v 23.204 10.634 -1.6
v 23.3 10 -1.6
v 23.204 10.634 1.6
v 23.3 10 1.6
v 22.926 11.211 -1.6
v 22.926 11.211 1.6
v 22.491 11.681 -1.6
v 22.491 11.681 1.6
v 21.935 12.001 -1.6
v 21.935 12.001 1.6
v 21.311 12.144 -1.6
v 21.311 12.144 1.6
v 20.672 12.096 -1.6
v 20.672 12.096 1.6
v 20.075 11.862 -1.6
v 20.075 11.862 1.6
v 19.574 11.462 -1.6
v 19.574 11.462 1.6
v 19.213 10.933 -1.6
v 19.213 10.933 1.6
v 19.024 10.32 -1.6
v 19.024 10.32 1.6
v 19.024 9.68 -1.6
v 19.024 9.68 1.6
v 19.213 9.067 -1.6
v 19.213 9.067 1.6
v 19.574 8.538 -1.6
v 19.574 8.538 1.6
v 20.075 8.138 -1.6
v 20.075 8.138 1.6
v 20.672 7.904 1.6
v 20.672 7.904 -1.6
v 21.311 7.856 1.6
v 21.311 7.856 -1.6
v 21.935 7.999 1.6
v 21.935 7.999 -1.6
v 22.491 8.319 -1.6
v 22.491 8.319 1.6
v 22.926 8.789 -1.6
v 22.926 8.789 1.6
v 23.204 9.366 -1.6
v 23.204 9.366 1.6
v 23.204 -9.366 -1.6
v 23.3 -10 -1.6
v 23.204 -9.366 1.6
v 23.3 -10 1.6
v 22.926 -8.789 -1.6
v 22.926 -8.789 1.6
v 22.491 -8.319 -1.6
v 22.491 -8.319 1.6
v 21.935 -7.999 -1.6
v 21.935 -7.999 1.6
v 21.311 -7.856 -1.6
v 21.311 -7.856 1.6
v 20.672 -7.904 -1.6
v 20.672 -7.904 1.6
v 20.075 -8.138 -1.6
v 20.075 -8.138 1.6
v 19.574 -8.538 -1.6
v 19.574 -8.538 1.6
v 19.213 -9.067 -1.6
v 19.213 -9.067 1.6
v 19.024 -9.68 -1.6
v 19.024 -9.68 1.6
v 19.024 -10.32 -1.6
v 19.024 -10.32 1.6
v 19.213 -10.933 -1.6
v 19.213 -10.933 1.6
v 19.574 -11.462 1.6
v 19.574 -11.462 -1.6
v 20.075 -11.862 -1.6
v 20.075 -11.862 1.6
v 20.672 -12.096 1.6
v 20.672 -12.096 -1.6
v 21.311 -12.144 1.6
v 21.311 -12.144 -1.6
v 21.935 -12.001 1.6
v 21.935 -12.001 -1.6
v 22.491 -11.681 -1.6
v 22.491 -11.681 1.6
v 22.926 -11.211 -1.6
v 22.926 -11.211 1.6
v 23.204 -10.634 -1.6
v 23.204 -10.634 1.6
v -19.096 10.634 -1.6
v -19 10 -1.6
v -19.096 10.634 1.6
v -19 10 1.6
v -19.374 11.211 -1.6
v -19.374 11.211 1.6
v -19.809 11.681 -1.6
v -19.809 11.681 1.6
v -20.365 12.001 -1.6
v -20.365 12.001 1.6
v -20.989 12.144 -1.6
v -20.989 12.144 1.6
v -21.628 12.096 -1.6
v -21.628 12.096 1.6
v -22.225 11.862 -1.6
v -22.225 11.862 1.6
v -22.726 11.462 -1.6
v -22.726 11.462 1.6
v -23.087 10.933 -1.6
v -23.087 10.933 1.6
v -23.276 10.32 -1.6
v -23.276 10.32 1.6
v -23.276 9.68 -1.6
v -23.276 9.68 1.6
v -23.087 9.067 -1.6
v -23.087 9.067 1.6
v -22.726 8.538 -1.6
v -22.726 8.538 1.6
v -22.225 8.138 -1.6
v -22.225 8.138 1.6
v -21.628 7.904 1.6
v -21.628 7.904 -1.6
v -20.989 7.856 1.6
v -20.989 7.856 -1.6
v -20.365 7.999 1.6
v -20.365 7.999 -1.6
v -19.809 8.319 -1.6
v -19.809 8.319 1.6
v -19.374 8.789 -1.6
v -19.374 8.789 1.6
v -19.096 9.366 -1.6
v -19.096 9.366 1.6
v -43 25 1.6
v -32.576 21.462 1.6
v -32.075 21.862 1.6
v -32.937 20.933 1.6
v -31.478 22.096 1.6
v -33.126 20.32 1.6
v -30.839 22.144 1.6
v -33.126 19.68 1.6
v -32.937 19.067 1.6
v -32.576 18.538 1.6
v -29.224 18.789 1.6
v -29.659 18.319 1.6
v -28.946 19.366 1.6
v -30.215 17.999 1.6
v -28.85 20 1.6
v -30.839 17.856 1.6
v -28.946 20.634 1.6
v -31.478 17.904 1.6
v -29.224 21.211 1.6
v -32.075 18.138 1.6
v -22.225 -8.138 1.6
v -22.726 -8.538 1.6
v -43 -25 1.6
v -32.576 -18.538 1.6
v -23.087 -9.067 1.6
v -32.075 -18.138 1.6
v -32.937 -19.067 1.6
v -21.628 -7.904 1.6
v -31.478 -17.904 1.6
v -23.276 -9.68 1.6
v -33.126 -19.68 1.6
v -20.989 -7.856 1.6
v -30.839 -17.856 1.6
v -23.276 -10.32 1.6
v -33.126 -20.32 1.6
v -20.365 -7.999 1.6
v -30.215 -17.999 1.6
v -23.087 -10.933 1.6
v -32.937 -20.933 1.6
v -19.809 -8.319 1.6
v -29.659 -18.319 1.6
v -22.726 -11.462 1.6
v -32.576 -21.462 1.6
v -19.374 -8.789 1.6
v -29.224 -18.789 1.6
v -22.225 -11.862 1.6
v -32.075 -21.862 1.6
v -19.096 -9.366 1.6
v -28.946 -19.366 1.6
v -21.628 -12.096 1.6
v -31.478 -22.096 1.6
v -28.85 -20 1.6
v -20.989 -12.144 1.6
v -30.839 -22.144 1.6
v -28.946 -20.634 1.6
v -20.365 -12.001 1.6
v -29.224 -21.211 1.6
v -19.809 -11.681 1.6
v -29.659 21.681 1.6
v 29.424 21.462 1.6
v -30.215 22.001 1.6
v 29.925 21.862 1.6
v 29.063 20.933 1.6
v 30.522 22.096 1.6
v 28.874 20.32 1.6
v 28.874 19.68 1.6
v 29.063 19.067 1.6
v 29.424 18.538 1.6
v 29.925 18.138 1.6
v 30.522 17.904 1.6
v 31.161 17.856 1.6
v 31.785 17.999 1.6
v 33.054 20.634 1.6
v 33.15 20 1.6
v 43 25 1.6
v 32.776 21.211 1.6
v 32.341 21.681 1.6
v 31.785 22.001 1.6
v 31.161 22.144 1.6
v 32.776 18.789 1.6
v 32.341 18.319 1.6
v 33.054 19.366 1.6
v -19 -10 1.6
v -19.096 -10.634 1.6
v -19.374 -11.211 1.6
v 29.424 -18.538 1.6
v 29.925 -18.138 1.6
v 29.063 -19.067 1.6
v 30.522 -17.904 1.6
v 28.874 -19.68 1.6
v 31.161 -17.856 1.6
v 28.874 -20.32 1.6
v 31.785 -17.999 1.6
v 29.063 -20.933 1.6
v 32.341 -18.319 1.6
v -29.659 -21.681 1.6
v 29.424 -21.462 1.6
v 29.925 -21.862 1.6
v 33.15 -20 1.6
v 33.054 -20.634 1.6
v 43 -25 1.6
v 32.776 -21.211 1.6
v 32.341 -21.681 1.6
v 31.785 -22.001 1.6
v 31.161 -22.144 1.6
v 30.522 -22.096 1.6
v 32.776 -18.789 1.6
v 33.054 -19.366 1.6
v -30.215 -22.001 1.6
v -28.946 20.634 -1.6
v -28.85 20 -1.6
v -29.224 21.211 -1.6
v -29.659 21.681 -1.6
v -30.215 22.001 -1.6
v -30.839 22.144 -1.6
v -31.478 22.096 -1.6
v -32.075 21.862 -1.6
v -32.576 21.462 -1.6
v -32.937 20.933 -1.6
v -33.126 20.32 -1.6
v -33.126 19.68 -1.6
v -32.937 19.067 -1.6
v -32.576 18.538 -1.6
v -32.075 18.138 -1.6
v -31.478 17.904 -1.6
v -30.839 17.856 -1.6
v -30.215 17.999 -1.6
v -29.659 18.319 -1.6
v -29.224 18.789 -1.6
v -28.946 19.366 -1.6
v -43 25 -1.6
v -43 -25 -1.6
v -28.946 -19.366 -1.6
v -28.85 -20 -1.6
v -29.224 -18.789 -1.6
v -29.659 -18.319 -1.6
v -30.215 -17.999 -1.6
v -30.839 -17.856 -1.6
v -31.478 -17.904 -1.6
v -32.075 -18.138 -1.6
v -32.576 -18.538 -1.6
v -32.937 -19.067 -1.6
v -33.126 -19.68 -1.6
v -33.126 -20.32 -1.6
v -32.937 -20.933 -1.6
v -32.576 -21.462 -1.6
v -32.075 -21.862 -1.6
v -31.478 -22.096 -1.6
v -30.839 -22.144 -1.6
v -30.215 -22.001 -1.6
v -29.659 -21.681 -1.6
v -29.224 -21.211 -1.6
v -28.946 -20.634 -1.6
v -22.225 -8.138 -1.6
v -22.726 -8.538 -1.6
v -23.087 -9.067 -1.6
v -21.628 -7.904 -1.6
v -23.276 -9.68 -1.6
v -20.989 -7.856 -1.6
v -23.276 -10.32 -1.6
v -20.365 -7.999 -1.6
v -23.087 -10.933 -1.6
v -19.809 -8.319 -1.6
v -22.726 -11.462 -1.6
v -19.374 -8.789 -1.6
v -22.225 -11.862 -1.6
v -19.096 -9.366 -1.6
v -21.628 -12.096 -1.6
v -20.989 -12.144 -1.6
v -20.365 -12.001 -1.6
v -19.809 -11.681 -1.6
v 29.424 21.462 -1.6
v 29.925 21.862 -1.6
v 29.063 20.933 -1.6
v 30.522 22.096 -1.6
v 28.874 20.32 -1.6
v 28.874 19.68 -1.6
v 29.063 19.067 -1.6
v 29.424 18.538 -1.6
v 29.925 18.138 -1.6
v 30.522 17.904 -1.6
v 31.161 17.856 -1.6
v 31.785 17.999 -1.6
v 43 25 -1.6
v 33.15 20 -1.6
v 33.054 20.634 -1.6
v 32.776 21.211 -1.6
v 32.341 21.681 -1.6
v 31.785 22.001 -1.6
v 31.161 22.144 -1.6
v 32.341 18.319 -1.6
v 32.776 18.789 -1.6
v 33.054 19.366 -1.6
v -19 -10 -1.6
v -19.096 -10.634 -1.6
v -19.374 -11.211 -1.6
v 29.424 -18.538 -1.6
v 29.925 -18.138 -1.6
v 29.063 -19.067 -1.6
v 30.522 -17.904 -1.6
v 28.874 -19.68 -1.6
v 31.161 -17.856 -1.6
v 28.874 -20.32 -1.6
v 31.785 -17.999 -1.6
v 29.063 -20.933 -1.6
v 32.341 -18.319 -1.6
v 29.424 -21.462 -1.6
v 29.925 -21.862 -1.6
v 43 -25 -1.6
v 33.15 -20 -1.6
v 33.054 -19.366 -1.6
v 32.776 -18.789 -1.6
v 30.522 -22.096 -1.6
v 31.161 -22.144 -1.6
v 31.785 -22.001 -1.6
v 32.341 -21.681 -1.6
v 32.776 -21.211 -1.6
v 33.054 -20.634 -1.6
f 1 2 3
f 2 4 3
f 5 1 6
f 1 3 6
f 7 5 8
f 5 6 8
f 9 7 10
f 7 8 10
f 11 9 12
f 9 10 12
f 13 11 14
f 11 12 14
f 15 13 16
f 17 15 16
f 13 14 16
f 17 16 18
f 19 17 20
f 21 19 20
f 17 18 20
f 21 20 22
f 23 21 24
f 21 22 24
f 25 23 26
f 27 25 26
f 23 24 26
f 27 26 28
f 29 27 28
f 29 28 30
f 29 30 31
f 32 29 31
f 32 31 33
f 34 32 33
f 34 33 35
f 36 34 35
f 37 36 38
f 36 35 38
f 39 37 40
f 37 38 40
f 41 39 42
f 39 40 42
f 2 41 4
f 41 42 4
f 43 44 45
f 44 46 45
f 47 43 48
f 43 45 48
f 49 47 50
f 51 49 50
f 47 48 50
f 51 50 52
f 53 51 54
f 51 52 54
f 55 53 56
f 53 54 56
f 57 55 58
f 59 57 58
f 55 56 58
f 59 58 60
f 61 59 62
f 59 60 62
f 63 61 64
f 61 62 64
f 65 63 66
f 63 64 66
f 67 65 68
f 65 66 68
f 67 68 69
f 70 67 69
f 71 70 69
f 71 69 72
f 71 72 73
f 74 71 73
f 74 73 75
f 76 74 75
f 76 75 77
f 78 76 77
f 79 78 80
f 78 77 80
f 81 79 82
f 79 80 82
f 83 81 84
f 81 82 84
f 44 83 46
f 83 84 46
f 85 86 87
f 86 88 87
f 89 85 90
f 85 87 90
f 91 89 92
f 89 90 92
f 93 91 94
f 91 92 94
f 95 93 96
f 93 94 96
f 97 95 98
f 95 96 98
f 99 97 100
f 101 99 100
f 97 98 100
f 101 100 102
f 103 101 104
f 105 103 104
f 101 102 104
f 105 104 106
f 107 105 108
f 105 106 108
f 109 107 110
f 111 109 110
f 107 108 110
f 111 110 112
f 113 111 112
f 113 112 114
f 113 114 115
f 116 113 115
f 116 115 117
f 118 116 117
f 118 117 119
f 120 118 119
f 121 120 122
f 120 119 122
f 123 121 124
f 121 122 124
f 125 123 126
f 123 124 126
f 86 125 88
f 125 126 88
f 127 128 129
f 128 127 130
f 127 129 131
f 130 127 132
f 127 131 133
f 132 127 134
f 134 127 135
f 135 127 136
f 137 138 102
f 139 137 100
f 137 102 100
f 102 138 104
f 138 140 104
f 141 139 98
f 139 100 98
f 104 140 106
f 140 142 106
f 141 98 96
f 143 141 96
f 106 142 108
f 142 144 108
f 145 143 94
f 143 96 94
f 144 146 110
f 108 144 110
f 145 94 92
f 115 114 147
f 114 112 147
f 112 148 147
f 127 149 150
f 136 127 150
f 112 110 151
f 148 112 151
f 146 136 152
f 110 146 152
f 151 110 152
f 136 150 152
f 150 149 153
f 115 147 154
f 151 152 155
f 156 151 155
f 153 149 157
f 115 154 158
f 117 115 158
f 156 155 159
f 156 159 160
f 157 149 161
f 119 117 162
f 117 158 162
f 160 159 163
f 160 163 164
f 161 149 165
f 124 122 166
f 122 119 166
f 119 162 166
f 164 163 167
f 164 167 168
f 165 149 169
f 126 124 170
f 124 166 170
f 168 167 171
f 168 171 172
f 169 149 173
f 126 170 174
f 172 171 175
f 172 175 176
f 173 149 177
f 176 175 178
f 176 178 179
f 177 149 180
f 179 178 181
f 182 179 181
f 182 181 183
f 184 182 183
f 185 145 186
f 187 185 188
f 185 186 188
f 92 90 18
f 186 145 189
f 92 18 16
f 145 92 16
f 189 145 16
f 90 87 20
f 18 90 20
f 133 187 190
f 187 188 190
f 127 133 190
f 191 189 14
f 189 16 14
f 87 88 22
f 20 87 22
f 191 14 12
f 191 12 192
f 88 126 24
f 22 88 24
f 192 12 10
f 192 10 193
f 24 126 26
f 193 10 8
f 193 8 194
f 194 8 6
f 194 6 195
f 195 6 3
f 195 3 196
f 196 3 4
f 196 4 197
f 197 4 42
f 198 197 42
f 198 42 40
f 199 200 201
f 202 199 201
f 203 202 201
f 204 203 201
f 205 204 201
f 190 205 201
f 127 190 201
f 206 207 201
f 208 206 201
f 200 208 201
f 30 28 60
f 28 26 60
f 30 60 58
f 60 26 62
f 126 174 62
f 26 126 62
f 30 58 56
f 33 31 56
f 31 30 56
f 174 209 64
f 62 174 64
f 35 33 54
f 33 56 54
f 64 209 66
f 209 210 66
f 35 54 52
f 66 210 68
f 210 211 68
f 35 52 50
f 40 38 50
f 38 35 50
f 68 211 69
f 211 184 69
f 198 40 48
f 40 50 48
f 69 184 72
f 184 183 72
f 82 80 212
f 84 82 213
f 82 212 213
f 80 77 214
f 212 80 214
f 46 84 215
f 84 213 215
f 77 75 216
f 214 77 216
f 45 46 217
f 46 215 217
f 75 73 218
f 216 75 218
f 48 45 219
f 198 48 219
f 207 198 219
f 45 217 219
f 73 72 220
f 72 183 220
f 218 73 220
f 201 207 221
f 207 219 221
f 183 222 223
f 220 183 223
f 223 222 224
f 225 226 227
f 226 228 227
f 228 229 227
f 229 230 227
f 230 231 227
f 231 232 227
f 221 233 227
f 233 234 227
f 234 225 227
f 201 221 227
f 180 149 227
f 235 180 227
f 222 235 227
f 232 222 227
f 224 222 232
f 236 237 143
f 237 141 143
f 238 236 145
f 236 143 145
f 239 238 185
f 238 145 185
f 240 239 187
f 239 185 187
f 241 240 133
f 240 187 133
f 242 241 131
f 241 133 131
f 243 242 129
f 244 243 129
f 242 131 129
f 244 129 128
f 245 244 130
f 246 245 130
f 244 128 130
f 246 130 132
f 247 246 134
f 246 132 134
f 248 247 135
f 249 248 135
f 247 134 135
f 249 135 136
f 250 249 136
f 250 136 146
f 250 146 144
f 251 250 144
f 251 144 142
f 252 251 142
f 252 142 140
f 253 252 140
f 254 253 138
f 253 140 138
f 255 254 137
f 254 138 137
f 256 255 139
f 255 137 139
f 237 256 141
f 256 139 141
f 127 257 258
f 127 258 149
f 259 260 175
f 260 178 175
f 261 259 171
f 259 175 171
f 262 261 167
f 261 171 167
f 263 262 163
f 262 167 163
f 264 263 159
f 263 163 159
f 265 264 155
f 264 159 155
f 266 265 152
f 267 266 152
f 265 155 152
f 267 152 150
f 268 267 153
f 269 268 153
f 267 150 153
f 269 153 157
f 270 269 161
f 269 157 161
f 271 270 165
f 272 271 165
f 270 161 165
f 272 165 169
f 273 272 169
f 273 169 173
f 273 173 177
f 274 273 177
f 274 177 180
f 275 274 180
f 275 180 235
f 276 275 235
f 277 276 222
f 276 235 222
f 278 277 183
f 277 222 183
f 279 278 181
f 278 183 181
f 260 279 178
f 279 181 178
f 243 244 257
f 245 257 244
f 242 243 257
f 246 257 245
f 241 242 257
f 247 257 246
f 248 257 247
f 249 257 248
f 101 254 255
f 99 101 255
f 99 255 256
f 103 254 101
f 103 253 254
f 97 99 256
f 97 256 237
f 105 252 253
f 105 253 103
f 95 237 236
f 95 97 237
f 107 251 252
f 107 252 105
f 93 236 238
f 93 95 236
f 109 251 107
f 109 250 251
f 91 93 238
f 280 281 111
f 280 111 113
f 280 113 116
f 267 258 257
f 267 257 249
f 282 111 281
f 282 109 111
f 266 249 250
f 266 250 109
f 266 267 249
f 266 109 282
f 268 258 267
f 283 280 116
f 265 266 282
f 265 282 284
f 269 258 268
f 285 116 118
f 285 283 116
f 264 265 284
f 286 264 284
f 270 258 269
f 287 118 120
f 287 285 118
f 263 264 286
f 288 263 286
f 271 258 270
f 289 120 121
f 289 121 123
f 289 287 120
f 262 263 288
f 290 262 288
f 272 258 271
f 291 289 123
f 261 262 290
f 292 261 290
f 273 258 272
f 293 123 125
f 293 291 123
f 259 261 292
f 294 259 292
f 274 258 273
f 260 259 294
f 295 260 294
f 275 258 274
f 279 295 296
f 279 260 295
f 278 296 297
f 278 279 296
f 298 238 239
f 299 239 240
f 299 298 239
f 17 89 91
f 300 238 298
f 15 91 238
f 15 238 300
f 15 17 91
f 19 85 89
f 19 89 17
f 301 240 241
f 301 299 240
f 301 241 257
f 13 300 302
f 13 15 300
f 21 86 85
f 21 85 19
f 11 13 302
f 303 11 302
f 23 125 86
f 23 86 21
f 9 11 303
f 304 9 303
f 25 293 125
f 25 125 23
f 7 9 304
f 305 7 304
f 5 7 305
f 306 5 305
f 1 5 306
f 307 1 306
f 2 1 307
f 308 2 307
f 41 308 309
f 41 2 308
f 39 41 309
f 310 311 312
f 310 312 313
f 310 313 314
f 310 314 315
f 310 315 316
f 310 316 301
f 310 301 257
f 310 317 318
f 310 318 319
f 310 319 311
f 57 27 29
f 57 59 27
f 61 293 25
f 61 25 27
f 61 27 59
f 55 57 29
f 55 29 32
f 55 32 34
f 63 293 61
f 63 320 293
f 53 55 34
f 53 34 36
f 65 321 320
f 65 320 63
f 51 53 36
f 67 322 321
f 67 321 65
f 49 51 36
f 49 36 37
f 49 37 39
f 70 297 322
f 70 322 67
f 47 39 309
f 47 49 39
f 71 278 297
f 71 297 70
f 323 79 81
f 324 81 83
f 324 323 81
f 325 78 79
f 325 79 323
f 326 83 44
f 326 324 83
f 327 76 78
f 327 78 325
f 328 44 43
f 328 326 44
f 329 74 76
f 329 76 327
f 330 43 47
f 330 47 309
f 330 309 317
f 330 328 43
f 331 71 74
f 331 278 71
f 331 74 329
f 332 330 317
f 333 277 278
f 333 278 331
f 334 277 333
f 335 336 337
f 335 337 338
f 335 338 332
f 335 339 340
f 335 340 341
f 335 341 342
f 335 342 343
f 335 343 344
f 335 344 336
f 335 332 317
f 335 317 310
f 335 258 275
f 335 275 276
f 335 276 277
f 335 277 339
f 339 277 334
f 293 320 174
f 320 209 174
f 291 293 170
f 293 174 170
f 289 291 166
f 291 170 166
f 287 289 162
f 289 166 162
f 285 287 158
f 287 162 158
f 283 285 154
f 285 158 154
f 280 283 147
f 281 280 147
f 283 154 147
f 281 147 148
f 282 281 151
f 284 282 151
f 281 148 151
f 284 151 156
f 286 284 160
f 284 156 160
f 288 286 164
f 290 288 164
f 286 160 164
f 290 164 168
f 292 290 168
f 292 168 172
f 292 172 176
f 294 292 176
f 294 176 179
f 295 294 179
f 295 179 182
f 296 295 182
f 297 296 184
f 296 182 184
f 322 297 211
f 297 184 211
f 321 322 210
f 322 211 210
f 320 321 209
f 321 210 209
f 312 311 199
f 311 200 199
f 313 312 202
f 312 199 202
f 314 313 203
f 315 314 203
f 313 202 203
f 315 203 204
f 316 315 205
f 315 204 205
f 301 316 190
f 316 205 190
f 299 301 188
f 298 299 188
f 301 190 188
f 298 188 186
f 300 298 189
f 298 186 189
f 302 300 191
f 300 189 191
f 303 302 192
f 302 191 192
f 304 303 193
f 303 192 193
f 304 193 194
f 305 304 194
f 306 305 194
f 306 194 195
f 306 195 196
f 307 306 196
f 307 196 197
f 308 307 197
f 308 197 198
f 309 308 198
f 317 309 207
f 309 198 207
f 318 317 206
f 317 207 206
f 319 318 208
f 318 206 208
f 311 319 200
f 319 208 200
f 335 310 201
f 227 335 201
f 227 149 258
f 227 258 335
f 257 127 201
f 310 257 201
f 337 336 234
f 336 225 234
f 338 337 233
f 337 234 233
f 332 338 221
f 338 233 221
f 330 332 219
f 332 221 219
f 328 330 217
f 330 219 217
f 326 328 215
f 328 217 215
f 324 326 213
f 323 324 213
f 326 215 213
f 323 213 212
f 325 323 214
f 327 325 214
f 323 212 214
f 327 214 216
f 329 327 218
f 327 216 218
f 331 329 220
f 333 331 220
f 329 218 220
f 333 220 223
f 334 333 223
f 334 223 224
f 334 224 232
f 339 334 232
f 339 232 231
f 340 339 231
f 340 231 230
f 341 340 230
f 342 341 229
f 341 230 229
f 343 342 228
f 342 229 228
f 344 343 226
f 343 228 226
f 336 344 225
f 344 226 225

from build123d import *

# Parameters (mm, degrees)
F0_W     = 86
F0_H     = 3.2
F1_DEPTH = 25
F2_R     = 2.15
F3_DEPTH = 12.5
F4_R     = 2.15
F5_DEPTH = 12.5


with BuildPart() as f1:
    # F0 (on Front) → F1 (new body, symmetric)
    with BuildSketch(Plane.XZ):
        Rectangle(F0_W, F0_H)
    extrude(amount=F1_DEPTH, both=True)

    # F2 (on Top) → F3 (cut, symmetric)
    with BuildSketch(Plane.XY):
        with Locations((-31, -20)):
            Circle(F2_R)
        with Locations((31, -20)):
            Circle(F2_R)
        with Locations((-31, 20)):
            Circle(F2_R)
        with Locations((31, 20)):
            Circle(F2_R)
    extrude(amount=F3_DEPTH, both=True, mode=Mode.SUBTRACT)

    # F4 (on Top) → F5 (cut, symmetric)
    with BuildSketch(Plane.XY):
        with Locations((-21.15, 10)):
            Circle(F4_R)
        with Locations((-21.15, -10)):
            Circle(F4_R)
        with Locations((21.15, 10)):
            Circle(F4_R)
        with Locations((21.15, -10)):
            Circle(F4_R)
    extrude(amount=F5_DEPTH, both=True, mode=Mode.SUBTRACT)


solid = f1.part
